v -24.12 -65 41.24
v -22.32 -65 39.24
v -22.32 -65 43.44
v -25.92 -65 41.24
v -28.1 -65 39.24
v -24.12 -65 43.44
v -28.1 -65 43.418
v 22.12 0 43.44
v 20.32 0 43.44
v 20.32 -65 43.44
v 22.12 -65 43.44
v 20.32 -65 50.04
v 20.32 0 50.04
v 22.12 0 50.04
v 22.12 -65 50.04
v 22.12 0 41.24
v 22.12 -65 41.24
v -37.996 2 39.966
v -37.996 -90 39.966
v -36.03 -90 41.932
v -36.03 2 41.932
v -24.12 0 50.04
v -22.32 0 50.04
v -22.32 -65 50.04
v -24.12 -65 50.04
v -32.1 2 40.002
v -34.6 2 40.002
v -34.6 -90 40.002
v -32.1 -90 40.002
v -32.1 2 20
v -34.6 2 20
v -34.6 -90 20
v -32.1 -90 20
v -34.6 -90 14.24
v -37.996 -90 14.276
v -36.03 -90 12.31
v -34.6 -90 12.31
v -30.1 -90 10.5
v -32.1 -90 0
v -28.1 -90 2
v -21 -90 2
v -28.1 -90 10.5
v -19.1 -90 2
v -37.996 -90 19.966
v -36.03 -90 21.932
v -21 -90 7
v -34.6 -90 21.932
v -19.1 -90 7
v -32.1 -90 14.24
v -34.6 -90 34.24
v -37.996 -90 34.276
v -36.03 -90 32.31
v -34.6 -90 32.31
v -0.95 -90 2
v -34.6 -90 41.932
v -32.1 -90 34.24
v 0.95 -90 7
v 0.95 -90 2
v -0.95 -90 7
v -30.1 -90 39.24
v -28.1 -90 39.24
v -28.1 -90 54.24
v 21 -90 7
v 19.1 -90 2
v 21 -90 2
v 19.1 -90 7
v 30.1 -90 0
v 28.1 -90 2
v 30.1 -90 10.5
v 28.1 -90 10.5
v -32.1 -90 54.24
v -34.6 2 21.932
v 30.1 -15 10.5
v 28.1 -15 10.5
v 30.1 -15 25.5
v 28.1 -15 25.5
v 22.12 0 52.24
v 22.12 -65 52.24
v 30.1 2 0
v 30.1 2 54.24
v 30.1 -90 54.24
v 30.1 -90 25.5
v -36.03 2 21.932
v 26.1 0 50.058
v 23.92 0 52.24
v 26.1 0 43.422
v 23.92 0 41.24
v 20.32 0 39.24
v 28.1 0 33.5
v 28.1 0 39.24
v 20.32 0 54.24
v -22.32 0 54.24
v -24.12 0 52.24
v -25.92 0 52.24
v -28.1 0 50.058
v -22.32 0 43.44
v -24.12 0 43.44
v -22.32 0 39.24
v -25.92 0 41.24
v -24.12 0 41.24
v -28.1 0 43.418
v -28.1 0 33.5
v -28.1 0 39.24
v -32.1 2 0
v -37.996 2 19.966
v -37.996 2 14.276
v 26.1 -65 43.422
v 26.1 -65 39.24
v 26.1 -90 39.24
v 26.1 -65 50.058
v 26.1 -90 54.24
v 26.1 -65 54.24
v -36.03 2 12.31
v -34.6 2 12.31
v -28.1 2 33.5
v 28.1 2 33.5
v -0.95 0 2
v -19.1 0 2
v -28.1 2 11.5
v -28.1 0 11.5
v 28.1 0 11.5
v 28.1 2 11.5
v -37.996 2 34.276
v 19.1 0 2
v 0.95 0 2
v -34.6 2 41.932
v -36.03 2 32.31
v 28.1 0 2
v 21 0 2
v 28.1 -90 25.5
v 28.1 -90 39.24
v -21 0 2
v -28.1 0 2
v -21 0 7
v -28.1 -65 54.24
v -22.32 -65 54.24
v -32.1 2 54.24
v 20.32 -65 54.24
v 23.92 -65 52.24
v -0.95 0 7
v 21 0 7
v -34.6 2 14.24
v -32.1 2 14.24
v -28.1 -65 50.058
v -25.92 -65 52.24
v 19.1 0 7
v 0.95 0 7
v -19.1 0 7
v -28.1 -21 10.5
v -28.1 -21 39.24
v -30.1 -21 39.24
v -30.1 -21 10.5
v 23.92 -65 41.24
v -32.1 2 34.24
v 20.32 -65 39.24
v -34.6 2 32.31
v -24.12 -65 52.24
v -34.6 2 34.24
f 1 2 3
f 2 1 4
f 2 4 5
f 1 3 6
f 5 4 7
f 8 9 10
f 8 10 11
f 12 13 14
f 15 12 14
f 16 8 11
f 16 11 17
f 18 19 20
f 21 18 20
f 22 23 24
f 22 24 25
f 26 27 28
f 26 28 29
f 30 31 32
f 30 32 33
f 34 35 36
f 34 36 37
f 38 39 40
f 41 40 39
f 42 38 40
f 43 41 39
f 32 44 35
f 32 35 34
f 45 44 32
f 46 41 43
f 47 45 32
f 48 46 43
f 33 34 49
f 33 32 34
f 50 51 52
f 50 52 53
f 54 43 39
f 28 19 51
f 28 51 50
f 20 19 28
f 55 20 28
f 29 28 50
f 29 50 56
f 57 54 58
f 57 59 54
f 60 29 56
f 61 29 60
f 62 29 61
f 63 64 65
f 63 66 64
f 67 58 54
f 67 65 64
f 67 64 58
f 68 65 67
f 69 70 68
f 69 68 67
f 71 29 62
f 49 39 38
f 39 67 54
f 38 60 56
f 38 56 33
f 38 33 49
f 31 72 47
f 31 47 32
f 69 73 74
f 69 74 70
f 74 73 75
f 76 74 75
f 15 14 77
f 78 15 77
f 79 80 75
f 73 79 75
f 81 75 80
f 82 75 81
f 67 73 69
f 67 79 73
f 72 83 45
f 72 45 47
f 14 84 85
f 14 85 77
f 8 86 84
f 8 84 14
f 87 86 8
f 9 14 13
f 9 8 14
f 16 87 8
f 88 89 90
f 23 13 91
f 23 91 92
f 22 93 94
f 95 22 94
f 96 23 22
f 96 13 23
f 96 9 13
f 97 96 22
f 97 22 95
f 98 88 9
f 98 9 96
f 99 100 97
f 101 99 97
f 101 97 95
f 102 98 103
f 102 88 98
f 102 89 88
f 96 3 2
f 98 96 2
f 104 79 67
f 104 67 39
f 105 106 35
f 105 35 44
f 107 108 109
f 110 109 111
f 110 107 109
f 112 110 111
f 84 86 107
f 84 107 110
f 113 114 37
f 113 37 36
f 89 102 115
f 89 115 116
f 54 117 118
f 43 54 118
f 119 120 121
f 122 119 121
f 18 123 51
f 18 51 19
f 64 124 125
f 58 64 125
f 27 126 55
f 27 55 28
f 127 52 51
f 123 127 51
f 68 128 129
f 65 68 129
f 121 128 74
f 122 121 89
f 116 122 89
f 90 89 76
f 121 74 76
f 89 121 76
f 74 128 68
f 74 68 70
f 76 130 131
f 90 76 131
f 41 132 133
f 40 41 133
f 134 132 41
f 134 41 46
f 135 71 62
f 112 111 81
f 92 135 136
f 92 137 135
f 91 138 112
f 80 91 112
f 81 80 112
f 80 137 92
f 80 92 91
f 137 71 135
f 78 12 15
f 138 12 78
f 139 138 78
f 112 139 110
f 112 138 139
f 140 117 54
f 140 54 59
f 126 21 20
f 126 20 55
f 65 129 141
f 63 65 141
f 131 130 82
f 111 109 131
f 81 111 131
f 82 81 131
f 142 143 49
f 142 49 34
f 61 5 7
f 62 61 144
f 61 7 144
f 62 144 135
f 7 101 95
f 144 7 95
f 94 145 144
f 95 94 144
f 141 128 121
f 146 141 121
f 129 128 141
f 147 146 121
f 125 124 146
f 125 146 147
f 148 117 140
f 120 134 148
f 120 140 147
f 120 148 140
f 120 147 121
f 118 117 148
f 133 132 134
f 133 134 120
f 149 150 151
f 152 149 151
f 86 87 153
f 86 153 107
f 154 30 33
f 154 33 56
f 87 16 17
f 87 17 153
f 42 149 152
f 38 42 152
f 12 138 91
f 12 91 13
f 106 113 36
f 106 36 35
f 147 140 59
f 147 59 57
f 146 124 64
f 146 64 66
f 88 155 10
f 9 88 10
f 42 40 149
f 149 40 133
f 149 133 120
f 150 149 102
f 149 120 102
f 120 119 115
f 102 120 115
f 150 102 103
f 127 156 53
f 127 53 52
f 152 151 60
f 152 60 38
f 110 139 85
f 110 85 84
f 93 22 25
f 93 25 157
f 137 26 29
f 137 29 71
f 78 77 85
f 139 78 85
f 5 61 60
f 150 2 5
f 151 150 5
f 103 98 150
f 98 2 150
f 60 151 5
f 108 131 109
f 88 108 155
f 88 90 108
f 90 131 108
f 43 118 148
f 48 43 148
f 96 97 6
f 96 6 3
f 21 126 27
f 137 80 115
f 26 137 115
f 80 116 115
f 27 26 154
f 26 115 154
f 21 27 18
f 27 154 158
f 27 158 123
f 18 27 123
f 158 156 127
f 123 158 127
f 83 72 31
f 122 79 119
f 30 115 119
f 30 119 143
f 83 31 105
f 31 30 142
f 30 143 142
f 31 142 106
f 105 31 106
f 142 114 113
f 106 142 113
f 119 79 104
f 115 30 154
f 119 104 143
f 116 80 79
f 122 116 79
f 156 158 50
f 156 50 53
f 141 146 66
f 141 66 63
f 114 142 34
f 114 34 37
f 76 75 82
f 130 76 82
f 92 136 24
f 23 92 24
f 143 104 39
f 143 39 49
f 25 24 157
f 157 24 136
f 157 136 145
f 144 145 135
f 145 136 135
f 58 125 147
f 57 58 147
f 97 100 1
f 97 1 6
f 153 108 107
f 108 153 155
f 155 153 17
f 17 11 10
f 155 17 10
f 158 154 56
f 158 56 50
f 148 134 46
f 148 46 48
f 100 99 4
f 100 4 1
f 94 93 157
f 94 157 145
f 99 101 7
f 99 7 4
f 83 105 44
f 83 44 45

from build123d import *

# Parameters (mm, degrees)
SKETCH_W        = 1.9
SKETCH_H        = 5
PAD_DEPTH       = 90
SKETCH001_W     = 2
SKETCH001_H     = 69
SKETCH001_H_2   = 73
POCKET_DEPTH    = 5
SKETCH002_W     = 60.2
SKETCH002_H     = 11.5
PAD001_DEPTH    = 2
SKETCH004_W     = 2
SKETCH004_H     = 2
PAD002_DEPTH    = 4
PAD003_DEPTH    = 92
SKETCH006_W     = 2
SKETCH006_H     = 73
PAD004_DEPTH    = 5
SKETCH007_W     = 2
SKETCH007_H     = 92
PAD005_DEPTH    = 38.74
SKETCH008_W     = 15
SKETCH008_H     = 75
POCKET001_DEPTH = 2
SKETCH009_W     = 2
SKETCH009_H     = 23
PAD006_DEPTH    = 38.74
SKETCH010_W     = 56.2
SKETCH010_H     = 2
PAD007_DEPTH    = 42.74
SKETCH011_W     = 56.2
SKETCH011_H     = 22
POCKET002_DEPTH = 2
SKETCH012_W     = 2
SKETCH012_H     = 15
PAD008_DEPTH    = 69
SKETCH013_W     = 2
SKETCH013_H     = 15
PAD009_DEPTH    = 90
PAD010_DEPTH    = 65


with BuildPart() as part:
    # Sketch → Pad (new body)
    with BuildSketch(Plane.XZ):
        Polygon((-30.1, 0), (30.1, 0), (30.1, 15.5), (28.1, 15.5), (28.1, 2), (-28.1, 2), (-28.1, 15.5), (-30.1, 15.5), align=None)
        with Locations((0, 4.5)):
            Rectangle(SKETCH_W, SKETCH_H)
        with Locations((-20.05, 4.5)):
            Rectangle(SKETCH_W, SKETCH_H)
        with Locations((20.05, 4.5)):
            Rectangle(SKETCH_W, SKETCH_H)
    extrude(amount=PAD_DEPTH)

    # Sketch001 (on Face3 of Pad) → Pocket (cut)
    with BuildSketch(Plane(origin=(0, 0, 15.5), x_dir=(-1, 0, 0), z_dir=(0, 0, 1))):
        with Locations((29.1, 55.5)):
            Rectangle(SKETCH001_W, SKETCH001_H)
        with Locations((-29.1, 53.5)):
            Rectangle(SKETCH001_W, SKETCH001_H_2)
    extrude(amount=-POCKET_DEPTH, mode=Mode.SUBTRACT)

    # Sketch002 (on Face2 of Pocket) → Pad001 (join)
    with BuildSketch(Plane(origin=(0, 0, 0), x_dir=(1, 0, 0), z_dir=(0, 1, 0))):
        with Locations((0, -5.75)):
            Rectangle(SKETCH002_W, SKETCH002_H)
    extrude(amount=PAD001_DEPTH)

    # Sketch004 → Pad002 (join)
    with BuildSketch(Plane(origin=(0, 0, 11.5), x_dir=(-1, 0, 0), z_dir=(0, 0, 1))):
        with Locations((-29.1, -1)):
            Rectangle(SKETCH004_W, SKETCH004_H)
        with Locations((29.1, -1)):
            Rectangle(SKETCH004_W, SKETCH004_H)
    extrude(amount=PAD002_DEPTH)

    # Sketch005 (on Face26 of Pad002) → Pad003 (join)
    with BuildSketch(Plane(origin=(0, 2, 0), x_dir=(1, 0, 0), z_dir=(0, 1, 0))):
        Polygon((-30.1, -54.24), (-30.1, 0), (-32.1, 0), (-32.1, -14.24), (-34.6, -14.24), (-34.6, -12.31), (-36.03, -12.31), (-37.995757, -14.275757), (-37.995757, -19.965757), (-36.03, -21.931514), (-34.6, -21.931514), (-34.6, -20), (-32.1, -20), (-32.1, -34.24), (-34.6, -34.24), (-34.6, -32.31), (-36.03, -32.31), (-37.995757, -34.275757), (-37.995757, -39.965757), (-36.03, -41.931514), (-34.6, -41.931514), (-34.6, -40.001514), (-32.1, -40.001514), (-32.1, -54.24), align=None)
    extrude(amount=-PAD003_DEPTH)

    # Sketch006 (on Face46 of Pad003) → Pad004 (join)
    with BuildSketch(Plane(origin=(0, 0, 10.5), x_dir=(-1, 0, 0), z_dir=(0, 0, 1))):
        with Locations((-29.1, 53.5)):
            Rectangle(SKETCH006_W, SKETCH006_H)
    extrude(amount=PAD004_DEPTH)

    # Sketch007 (on Face48 of Pad004) → Pad005 (join)
    with BuildSketch(Plane(origin=(0, 0, 15.5), x_dir=(-1, 0, 0), z_dir=(0, 0, 1))):
        with Locations((-29.1, 44)):
            Rectangle(SKETCH007_W, SKETCH007_H)
    extrude(amount=PAD005_DEPTH)

    # Sketch008 (on Face48 of Pad005) → Pocket001 (cut)
    with BuildSketch(Plane(origin=(30.1, 0, 0), x_dir=(0, 0, 1), z_dir=(1, 0, 0))):
        with Locations((18, 52.5)):
            Rectangle(SKETCH008_W, SKETCH008_H)
    extrude(amount=-POCKET001_DEPTH, mode=Mode.SUBTRACT)

    # Sketch009 (on Face51 of Pocket001) → Pad006 (join)
    with BuildSketch(Plane(origin=(0, 0, 15.5), x_dir=(-1, 0, 0), z_dir=(0, 0, 1))):
        with Locations((29.1, 9.5)):
            Rectangle(SKETCH009_W, SKETCH009_H)
    extrude(amount=PAD006_DEPTH)

    # Sketch010 (on Face17 of Pad006) → Pad007 (join)
    with BuildSketch(Plane(origin=(0, 0, 11.5), x_dir=(-1, 0, 0), z_dir=(0, 0, 1))):
        with Locations((0, -1)):
            Rectangle(SKETCH010_W, SKETCH010_H)
    extrude(amount=PAD007_DEPTH)

    # Sketch011 (on Face47 of Pad007) → Pocket002 (cut)
    with BuildSketch(Plane.XZ):
        with Locations((0, 22.5)):
            Rectangle(SKETCH011_W, SKETCH011_H)
    extrude(amount=-POCKET002_DEPTH, mode=Mode.SUBTRACT)

    # Sketch012 (on Face49 of Pocket002) → Pad008 (join)
    with BuildSketch(Plane.XZ.offset(21)):
        with Locations((-29.1, 46.74)):
            Rectangle(SKETCH012_W, SKETCH012_H)
    extrude(amount=PAD008_DEPTH)

    # Sketch013 (on Face26 of Pad008) → Pad009 (join)
    with BuildSketch(Plane.XZ):
        with Locations((27.1, 46.74)):
            Rectangle(SKETCH013_W, SKETCH013_H)
    extrude(amount=PAD009_DEPTH)

    # Sketch014 (on Face45 of Pad009) → Pad010 (join)
    with BuildSketch(Plane.XZ):
        Polygon((20.32, 39.24), (20.32, 43.44), (22.12, 43.44), (22.12, 41.24), (23.92, 41.24), (26.118204, 43.44), (26.118204, 39.24), align=None)
        Polygon((20.32, 54.24), (20.32, 50.04), (22.12, 50.04), (22.12, 52.24), (23.92, 52.24), (26.118204, 50.04), (26.118204, 54.24), align=None)
        Polygon((-22.32, 43.44), (-22.32, 39.24), (-28.12, 39.24), (-28.12, 43.438204), (-25.92, 41.24), (-24.12, 41.24), (-24.12, 43.44), align=None)
        Polygon((-22.32, 54.24), (-22.32, 50.04), (-24.12, 50.04), (-24.12, 52.24), (-25.92, 52.24), (-28.118204, 50.04), (-28.118204, 54.24), align=None)
    extrude(amount=PAD010_DEPTH)


solid = part.part
